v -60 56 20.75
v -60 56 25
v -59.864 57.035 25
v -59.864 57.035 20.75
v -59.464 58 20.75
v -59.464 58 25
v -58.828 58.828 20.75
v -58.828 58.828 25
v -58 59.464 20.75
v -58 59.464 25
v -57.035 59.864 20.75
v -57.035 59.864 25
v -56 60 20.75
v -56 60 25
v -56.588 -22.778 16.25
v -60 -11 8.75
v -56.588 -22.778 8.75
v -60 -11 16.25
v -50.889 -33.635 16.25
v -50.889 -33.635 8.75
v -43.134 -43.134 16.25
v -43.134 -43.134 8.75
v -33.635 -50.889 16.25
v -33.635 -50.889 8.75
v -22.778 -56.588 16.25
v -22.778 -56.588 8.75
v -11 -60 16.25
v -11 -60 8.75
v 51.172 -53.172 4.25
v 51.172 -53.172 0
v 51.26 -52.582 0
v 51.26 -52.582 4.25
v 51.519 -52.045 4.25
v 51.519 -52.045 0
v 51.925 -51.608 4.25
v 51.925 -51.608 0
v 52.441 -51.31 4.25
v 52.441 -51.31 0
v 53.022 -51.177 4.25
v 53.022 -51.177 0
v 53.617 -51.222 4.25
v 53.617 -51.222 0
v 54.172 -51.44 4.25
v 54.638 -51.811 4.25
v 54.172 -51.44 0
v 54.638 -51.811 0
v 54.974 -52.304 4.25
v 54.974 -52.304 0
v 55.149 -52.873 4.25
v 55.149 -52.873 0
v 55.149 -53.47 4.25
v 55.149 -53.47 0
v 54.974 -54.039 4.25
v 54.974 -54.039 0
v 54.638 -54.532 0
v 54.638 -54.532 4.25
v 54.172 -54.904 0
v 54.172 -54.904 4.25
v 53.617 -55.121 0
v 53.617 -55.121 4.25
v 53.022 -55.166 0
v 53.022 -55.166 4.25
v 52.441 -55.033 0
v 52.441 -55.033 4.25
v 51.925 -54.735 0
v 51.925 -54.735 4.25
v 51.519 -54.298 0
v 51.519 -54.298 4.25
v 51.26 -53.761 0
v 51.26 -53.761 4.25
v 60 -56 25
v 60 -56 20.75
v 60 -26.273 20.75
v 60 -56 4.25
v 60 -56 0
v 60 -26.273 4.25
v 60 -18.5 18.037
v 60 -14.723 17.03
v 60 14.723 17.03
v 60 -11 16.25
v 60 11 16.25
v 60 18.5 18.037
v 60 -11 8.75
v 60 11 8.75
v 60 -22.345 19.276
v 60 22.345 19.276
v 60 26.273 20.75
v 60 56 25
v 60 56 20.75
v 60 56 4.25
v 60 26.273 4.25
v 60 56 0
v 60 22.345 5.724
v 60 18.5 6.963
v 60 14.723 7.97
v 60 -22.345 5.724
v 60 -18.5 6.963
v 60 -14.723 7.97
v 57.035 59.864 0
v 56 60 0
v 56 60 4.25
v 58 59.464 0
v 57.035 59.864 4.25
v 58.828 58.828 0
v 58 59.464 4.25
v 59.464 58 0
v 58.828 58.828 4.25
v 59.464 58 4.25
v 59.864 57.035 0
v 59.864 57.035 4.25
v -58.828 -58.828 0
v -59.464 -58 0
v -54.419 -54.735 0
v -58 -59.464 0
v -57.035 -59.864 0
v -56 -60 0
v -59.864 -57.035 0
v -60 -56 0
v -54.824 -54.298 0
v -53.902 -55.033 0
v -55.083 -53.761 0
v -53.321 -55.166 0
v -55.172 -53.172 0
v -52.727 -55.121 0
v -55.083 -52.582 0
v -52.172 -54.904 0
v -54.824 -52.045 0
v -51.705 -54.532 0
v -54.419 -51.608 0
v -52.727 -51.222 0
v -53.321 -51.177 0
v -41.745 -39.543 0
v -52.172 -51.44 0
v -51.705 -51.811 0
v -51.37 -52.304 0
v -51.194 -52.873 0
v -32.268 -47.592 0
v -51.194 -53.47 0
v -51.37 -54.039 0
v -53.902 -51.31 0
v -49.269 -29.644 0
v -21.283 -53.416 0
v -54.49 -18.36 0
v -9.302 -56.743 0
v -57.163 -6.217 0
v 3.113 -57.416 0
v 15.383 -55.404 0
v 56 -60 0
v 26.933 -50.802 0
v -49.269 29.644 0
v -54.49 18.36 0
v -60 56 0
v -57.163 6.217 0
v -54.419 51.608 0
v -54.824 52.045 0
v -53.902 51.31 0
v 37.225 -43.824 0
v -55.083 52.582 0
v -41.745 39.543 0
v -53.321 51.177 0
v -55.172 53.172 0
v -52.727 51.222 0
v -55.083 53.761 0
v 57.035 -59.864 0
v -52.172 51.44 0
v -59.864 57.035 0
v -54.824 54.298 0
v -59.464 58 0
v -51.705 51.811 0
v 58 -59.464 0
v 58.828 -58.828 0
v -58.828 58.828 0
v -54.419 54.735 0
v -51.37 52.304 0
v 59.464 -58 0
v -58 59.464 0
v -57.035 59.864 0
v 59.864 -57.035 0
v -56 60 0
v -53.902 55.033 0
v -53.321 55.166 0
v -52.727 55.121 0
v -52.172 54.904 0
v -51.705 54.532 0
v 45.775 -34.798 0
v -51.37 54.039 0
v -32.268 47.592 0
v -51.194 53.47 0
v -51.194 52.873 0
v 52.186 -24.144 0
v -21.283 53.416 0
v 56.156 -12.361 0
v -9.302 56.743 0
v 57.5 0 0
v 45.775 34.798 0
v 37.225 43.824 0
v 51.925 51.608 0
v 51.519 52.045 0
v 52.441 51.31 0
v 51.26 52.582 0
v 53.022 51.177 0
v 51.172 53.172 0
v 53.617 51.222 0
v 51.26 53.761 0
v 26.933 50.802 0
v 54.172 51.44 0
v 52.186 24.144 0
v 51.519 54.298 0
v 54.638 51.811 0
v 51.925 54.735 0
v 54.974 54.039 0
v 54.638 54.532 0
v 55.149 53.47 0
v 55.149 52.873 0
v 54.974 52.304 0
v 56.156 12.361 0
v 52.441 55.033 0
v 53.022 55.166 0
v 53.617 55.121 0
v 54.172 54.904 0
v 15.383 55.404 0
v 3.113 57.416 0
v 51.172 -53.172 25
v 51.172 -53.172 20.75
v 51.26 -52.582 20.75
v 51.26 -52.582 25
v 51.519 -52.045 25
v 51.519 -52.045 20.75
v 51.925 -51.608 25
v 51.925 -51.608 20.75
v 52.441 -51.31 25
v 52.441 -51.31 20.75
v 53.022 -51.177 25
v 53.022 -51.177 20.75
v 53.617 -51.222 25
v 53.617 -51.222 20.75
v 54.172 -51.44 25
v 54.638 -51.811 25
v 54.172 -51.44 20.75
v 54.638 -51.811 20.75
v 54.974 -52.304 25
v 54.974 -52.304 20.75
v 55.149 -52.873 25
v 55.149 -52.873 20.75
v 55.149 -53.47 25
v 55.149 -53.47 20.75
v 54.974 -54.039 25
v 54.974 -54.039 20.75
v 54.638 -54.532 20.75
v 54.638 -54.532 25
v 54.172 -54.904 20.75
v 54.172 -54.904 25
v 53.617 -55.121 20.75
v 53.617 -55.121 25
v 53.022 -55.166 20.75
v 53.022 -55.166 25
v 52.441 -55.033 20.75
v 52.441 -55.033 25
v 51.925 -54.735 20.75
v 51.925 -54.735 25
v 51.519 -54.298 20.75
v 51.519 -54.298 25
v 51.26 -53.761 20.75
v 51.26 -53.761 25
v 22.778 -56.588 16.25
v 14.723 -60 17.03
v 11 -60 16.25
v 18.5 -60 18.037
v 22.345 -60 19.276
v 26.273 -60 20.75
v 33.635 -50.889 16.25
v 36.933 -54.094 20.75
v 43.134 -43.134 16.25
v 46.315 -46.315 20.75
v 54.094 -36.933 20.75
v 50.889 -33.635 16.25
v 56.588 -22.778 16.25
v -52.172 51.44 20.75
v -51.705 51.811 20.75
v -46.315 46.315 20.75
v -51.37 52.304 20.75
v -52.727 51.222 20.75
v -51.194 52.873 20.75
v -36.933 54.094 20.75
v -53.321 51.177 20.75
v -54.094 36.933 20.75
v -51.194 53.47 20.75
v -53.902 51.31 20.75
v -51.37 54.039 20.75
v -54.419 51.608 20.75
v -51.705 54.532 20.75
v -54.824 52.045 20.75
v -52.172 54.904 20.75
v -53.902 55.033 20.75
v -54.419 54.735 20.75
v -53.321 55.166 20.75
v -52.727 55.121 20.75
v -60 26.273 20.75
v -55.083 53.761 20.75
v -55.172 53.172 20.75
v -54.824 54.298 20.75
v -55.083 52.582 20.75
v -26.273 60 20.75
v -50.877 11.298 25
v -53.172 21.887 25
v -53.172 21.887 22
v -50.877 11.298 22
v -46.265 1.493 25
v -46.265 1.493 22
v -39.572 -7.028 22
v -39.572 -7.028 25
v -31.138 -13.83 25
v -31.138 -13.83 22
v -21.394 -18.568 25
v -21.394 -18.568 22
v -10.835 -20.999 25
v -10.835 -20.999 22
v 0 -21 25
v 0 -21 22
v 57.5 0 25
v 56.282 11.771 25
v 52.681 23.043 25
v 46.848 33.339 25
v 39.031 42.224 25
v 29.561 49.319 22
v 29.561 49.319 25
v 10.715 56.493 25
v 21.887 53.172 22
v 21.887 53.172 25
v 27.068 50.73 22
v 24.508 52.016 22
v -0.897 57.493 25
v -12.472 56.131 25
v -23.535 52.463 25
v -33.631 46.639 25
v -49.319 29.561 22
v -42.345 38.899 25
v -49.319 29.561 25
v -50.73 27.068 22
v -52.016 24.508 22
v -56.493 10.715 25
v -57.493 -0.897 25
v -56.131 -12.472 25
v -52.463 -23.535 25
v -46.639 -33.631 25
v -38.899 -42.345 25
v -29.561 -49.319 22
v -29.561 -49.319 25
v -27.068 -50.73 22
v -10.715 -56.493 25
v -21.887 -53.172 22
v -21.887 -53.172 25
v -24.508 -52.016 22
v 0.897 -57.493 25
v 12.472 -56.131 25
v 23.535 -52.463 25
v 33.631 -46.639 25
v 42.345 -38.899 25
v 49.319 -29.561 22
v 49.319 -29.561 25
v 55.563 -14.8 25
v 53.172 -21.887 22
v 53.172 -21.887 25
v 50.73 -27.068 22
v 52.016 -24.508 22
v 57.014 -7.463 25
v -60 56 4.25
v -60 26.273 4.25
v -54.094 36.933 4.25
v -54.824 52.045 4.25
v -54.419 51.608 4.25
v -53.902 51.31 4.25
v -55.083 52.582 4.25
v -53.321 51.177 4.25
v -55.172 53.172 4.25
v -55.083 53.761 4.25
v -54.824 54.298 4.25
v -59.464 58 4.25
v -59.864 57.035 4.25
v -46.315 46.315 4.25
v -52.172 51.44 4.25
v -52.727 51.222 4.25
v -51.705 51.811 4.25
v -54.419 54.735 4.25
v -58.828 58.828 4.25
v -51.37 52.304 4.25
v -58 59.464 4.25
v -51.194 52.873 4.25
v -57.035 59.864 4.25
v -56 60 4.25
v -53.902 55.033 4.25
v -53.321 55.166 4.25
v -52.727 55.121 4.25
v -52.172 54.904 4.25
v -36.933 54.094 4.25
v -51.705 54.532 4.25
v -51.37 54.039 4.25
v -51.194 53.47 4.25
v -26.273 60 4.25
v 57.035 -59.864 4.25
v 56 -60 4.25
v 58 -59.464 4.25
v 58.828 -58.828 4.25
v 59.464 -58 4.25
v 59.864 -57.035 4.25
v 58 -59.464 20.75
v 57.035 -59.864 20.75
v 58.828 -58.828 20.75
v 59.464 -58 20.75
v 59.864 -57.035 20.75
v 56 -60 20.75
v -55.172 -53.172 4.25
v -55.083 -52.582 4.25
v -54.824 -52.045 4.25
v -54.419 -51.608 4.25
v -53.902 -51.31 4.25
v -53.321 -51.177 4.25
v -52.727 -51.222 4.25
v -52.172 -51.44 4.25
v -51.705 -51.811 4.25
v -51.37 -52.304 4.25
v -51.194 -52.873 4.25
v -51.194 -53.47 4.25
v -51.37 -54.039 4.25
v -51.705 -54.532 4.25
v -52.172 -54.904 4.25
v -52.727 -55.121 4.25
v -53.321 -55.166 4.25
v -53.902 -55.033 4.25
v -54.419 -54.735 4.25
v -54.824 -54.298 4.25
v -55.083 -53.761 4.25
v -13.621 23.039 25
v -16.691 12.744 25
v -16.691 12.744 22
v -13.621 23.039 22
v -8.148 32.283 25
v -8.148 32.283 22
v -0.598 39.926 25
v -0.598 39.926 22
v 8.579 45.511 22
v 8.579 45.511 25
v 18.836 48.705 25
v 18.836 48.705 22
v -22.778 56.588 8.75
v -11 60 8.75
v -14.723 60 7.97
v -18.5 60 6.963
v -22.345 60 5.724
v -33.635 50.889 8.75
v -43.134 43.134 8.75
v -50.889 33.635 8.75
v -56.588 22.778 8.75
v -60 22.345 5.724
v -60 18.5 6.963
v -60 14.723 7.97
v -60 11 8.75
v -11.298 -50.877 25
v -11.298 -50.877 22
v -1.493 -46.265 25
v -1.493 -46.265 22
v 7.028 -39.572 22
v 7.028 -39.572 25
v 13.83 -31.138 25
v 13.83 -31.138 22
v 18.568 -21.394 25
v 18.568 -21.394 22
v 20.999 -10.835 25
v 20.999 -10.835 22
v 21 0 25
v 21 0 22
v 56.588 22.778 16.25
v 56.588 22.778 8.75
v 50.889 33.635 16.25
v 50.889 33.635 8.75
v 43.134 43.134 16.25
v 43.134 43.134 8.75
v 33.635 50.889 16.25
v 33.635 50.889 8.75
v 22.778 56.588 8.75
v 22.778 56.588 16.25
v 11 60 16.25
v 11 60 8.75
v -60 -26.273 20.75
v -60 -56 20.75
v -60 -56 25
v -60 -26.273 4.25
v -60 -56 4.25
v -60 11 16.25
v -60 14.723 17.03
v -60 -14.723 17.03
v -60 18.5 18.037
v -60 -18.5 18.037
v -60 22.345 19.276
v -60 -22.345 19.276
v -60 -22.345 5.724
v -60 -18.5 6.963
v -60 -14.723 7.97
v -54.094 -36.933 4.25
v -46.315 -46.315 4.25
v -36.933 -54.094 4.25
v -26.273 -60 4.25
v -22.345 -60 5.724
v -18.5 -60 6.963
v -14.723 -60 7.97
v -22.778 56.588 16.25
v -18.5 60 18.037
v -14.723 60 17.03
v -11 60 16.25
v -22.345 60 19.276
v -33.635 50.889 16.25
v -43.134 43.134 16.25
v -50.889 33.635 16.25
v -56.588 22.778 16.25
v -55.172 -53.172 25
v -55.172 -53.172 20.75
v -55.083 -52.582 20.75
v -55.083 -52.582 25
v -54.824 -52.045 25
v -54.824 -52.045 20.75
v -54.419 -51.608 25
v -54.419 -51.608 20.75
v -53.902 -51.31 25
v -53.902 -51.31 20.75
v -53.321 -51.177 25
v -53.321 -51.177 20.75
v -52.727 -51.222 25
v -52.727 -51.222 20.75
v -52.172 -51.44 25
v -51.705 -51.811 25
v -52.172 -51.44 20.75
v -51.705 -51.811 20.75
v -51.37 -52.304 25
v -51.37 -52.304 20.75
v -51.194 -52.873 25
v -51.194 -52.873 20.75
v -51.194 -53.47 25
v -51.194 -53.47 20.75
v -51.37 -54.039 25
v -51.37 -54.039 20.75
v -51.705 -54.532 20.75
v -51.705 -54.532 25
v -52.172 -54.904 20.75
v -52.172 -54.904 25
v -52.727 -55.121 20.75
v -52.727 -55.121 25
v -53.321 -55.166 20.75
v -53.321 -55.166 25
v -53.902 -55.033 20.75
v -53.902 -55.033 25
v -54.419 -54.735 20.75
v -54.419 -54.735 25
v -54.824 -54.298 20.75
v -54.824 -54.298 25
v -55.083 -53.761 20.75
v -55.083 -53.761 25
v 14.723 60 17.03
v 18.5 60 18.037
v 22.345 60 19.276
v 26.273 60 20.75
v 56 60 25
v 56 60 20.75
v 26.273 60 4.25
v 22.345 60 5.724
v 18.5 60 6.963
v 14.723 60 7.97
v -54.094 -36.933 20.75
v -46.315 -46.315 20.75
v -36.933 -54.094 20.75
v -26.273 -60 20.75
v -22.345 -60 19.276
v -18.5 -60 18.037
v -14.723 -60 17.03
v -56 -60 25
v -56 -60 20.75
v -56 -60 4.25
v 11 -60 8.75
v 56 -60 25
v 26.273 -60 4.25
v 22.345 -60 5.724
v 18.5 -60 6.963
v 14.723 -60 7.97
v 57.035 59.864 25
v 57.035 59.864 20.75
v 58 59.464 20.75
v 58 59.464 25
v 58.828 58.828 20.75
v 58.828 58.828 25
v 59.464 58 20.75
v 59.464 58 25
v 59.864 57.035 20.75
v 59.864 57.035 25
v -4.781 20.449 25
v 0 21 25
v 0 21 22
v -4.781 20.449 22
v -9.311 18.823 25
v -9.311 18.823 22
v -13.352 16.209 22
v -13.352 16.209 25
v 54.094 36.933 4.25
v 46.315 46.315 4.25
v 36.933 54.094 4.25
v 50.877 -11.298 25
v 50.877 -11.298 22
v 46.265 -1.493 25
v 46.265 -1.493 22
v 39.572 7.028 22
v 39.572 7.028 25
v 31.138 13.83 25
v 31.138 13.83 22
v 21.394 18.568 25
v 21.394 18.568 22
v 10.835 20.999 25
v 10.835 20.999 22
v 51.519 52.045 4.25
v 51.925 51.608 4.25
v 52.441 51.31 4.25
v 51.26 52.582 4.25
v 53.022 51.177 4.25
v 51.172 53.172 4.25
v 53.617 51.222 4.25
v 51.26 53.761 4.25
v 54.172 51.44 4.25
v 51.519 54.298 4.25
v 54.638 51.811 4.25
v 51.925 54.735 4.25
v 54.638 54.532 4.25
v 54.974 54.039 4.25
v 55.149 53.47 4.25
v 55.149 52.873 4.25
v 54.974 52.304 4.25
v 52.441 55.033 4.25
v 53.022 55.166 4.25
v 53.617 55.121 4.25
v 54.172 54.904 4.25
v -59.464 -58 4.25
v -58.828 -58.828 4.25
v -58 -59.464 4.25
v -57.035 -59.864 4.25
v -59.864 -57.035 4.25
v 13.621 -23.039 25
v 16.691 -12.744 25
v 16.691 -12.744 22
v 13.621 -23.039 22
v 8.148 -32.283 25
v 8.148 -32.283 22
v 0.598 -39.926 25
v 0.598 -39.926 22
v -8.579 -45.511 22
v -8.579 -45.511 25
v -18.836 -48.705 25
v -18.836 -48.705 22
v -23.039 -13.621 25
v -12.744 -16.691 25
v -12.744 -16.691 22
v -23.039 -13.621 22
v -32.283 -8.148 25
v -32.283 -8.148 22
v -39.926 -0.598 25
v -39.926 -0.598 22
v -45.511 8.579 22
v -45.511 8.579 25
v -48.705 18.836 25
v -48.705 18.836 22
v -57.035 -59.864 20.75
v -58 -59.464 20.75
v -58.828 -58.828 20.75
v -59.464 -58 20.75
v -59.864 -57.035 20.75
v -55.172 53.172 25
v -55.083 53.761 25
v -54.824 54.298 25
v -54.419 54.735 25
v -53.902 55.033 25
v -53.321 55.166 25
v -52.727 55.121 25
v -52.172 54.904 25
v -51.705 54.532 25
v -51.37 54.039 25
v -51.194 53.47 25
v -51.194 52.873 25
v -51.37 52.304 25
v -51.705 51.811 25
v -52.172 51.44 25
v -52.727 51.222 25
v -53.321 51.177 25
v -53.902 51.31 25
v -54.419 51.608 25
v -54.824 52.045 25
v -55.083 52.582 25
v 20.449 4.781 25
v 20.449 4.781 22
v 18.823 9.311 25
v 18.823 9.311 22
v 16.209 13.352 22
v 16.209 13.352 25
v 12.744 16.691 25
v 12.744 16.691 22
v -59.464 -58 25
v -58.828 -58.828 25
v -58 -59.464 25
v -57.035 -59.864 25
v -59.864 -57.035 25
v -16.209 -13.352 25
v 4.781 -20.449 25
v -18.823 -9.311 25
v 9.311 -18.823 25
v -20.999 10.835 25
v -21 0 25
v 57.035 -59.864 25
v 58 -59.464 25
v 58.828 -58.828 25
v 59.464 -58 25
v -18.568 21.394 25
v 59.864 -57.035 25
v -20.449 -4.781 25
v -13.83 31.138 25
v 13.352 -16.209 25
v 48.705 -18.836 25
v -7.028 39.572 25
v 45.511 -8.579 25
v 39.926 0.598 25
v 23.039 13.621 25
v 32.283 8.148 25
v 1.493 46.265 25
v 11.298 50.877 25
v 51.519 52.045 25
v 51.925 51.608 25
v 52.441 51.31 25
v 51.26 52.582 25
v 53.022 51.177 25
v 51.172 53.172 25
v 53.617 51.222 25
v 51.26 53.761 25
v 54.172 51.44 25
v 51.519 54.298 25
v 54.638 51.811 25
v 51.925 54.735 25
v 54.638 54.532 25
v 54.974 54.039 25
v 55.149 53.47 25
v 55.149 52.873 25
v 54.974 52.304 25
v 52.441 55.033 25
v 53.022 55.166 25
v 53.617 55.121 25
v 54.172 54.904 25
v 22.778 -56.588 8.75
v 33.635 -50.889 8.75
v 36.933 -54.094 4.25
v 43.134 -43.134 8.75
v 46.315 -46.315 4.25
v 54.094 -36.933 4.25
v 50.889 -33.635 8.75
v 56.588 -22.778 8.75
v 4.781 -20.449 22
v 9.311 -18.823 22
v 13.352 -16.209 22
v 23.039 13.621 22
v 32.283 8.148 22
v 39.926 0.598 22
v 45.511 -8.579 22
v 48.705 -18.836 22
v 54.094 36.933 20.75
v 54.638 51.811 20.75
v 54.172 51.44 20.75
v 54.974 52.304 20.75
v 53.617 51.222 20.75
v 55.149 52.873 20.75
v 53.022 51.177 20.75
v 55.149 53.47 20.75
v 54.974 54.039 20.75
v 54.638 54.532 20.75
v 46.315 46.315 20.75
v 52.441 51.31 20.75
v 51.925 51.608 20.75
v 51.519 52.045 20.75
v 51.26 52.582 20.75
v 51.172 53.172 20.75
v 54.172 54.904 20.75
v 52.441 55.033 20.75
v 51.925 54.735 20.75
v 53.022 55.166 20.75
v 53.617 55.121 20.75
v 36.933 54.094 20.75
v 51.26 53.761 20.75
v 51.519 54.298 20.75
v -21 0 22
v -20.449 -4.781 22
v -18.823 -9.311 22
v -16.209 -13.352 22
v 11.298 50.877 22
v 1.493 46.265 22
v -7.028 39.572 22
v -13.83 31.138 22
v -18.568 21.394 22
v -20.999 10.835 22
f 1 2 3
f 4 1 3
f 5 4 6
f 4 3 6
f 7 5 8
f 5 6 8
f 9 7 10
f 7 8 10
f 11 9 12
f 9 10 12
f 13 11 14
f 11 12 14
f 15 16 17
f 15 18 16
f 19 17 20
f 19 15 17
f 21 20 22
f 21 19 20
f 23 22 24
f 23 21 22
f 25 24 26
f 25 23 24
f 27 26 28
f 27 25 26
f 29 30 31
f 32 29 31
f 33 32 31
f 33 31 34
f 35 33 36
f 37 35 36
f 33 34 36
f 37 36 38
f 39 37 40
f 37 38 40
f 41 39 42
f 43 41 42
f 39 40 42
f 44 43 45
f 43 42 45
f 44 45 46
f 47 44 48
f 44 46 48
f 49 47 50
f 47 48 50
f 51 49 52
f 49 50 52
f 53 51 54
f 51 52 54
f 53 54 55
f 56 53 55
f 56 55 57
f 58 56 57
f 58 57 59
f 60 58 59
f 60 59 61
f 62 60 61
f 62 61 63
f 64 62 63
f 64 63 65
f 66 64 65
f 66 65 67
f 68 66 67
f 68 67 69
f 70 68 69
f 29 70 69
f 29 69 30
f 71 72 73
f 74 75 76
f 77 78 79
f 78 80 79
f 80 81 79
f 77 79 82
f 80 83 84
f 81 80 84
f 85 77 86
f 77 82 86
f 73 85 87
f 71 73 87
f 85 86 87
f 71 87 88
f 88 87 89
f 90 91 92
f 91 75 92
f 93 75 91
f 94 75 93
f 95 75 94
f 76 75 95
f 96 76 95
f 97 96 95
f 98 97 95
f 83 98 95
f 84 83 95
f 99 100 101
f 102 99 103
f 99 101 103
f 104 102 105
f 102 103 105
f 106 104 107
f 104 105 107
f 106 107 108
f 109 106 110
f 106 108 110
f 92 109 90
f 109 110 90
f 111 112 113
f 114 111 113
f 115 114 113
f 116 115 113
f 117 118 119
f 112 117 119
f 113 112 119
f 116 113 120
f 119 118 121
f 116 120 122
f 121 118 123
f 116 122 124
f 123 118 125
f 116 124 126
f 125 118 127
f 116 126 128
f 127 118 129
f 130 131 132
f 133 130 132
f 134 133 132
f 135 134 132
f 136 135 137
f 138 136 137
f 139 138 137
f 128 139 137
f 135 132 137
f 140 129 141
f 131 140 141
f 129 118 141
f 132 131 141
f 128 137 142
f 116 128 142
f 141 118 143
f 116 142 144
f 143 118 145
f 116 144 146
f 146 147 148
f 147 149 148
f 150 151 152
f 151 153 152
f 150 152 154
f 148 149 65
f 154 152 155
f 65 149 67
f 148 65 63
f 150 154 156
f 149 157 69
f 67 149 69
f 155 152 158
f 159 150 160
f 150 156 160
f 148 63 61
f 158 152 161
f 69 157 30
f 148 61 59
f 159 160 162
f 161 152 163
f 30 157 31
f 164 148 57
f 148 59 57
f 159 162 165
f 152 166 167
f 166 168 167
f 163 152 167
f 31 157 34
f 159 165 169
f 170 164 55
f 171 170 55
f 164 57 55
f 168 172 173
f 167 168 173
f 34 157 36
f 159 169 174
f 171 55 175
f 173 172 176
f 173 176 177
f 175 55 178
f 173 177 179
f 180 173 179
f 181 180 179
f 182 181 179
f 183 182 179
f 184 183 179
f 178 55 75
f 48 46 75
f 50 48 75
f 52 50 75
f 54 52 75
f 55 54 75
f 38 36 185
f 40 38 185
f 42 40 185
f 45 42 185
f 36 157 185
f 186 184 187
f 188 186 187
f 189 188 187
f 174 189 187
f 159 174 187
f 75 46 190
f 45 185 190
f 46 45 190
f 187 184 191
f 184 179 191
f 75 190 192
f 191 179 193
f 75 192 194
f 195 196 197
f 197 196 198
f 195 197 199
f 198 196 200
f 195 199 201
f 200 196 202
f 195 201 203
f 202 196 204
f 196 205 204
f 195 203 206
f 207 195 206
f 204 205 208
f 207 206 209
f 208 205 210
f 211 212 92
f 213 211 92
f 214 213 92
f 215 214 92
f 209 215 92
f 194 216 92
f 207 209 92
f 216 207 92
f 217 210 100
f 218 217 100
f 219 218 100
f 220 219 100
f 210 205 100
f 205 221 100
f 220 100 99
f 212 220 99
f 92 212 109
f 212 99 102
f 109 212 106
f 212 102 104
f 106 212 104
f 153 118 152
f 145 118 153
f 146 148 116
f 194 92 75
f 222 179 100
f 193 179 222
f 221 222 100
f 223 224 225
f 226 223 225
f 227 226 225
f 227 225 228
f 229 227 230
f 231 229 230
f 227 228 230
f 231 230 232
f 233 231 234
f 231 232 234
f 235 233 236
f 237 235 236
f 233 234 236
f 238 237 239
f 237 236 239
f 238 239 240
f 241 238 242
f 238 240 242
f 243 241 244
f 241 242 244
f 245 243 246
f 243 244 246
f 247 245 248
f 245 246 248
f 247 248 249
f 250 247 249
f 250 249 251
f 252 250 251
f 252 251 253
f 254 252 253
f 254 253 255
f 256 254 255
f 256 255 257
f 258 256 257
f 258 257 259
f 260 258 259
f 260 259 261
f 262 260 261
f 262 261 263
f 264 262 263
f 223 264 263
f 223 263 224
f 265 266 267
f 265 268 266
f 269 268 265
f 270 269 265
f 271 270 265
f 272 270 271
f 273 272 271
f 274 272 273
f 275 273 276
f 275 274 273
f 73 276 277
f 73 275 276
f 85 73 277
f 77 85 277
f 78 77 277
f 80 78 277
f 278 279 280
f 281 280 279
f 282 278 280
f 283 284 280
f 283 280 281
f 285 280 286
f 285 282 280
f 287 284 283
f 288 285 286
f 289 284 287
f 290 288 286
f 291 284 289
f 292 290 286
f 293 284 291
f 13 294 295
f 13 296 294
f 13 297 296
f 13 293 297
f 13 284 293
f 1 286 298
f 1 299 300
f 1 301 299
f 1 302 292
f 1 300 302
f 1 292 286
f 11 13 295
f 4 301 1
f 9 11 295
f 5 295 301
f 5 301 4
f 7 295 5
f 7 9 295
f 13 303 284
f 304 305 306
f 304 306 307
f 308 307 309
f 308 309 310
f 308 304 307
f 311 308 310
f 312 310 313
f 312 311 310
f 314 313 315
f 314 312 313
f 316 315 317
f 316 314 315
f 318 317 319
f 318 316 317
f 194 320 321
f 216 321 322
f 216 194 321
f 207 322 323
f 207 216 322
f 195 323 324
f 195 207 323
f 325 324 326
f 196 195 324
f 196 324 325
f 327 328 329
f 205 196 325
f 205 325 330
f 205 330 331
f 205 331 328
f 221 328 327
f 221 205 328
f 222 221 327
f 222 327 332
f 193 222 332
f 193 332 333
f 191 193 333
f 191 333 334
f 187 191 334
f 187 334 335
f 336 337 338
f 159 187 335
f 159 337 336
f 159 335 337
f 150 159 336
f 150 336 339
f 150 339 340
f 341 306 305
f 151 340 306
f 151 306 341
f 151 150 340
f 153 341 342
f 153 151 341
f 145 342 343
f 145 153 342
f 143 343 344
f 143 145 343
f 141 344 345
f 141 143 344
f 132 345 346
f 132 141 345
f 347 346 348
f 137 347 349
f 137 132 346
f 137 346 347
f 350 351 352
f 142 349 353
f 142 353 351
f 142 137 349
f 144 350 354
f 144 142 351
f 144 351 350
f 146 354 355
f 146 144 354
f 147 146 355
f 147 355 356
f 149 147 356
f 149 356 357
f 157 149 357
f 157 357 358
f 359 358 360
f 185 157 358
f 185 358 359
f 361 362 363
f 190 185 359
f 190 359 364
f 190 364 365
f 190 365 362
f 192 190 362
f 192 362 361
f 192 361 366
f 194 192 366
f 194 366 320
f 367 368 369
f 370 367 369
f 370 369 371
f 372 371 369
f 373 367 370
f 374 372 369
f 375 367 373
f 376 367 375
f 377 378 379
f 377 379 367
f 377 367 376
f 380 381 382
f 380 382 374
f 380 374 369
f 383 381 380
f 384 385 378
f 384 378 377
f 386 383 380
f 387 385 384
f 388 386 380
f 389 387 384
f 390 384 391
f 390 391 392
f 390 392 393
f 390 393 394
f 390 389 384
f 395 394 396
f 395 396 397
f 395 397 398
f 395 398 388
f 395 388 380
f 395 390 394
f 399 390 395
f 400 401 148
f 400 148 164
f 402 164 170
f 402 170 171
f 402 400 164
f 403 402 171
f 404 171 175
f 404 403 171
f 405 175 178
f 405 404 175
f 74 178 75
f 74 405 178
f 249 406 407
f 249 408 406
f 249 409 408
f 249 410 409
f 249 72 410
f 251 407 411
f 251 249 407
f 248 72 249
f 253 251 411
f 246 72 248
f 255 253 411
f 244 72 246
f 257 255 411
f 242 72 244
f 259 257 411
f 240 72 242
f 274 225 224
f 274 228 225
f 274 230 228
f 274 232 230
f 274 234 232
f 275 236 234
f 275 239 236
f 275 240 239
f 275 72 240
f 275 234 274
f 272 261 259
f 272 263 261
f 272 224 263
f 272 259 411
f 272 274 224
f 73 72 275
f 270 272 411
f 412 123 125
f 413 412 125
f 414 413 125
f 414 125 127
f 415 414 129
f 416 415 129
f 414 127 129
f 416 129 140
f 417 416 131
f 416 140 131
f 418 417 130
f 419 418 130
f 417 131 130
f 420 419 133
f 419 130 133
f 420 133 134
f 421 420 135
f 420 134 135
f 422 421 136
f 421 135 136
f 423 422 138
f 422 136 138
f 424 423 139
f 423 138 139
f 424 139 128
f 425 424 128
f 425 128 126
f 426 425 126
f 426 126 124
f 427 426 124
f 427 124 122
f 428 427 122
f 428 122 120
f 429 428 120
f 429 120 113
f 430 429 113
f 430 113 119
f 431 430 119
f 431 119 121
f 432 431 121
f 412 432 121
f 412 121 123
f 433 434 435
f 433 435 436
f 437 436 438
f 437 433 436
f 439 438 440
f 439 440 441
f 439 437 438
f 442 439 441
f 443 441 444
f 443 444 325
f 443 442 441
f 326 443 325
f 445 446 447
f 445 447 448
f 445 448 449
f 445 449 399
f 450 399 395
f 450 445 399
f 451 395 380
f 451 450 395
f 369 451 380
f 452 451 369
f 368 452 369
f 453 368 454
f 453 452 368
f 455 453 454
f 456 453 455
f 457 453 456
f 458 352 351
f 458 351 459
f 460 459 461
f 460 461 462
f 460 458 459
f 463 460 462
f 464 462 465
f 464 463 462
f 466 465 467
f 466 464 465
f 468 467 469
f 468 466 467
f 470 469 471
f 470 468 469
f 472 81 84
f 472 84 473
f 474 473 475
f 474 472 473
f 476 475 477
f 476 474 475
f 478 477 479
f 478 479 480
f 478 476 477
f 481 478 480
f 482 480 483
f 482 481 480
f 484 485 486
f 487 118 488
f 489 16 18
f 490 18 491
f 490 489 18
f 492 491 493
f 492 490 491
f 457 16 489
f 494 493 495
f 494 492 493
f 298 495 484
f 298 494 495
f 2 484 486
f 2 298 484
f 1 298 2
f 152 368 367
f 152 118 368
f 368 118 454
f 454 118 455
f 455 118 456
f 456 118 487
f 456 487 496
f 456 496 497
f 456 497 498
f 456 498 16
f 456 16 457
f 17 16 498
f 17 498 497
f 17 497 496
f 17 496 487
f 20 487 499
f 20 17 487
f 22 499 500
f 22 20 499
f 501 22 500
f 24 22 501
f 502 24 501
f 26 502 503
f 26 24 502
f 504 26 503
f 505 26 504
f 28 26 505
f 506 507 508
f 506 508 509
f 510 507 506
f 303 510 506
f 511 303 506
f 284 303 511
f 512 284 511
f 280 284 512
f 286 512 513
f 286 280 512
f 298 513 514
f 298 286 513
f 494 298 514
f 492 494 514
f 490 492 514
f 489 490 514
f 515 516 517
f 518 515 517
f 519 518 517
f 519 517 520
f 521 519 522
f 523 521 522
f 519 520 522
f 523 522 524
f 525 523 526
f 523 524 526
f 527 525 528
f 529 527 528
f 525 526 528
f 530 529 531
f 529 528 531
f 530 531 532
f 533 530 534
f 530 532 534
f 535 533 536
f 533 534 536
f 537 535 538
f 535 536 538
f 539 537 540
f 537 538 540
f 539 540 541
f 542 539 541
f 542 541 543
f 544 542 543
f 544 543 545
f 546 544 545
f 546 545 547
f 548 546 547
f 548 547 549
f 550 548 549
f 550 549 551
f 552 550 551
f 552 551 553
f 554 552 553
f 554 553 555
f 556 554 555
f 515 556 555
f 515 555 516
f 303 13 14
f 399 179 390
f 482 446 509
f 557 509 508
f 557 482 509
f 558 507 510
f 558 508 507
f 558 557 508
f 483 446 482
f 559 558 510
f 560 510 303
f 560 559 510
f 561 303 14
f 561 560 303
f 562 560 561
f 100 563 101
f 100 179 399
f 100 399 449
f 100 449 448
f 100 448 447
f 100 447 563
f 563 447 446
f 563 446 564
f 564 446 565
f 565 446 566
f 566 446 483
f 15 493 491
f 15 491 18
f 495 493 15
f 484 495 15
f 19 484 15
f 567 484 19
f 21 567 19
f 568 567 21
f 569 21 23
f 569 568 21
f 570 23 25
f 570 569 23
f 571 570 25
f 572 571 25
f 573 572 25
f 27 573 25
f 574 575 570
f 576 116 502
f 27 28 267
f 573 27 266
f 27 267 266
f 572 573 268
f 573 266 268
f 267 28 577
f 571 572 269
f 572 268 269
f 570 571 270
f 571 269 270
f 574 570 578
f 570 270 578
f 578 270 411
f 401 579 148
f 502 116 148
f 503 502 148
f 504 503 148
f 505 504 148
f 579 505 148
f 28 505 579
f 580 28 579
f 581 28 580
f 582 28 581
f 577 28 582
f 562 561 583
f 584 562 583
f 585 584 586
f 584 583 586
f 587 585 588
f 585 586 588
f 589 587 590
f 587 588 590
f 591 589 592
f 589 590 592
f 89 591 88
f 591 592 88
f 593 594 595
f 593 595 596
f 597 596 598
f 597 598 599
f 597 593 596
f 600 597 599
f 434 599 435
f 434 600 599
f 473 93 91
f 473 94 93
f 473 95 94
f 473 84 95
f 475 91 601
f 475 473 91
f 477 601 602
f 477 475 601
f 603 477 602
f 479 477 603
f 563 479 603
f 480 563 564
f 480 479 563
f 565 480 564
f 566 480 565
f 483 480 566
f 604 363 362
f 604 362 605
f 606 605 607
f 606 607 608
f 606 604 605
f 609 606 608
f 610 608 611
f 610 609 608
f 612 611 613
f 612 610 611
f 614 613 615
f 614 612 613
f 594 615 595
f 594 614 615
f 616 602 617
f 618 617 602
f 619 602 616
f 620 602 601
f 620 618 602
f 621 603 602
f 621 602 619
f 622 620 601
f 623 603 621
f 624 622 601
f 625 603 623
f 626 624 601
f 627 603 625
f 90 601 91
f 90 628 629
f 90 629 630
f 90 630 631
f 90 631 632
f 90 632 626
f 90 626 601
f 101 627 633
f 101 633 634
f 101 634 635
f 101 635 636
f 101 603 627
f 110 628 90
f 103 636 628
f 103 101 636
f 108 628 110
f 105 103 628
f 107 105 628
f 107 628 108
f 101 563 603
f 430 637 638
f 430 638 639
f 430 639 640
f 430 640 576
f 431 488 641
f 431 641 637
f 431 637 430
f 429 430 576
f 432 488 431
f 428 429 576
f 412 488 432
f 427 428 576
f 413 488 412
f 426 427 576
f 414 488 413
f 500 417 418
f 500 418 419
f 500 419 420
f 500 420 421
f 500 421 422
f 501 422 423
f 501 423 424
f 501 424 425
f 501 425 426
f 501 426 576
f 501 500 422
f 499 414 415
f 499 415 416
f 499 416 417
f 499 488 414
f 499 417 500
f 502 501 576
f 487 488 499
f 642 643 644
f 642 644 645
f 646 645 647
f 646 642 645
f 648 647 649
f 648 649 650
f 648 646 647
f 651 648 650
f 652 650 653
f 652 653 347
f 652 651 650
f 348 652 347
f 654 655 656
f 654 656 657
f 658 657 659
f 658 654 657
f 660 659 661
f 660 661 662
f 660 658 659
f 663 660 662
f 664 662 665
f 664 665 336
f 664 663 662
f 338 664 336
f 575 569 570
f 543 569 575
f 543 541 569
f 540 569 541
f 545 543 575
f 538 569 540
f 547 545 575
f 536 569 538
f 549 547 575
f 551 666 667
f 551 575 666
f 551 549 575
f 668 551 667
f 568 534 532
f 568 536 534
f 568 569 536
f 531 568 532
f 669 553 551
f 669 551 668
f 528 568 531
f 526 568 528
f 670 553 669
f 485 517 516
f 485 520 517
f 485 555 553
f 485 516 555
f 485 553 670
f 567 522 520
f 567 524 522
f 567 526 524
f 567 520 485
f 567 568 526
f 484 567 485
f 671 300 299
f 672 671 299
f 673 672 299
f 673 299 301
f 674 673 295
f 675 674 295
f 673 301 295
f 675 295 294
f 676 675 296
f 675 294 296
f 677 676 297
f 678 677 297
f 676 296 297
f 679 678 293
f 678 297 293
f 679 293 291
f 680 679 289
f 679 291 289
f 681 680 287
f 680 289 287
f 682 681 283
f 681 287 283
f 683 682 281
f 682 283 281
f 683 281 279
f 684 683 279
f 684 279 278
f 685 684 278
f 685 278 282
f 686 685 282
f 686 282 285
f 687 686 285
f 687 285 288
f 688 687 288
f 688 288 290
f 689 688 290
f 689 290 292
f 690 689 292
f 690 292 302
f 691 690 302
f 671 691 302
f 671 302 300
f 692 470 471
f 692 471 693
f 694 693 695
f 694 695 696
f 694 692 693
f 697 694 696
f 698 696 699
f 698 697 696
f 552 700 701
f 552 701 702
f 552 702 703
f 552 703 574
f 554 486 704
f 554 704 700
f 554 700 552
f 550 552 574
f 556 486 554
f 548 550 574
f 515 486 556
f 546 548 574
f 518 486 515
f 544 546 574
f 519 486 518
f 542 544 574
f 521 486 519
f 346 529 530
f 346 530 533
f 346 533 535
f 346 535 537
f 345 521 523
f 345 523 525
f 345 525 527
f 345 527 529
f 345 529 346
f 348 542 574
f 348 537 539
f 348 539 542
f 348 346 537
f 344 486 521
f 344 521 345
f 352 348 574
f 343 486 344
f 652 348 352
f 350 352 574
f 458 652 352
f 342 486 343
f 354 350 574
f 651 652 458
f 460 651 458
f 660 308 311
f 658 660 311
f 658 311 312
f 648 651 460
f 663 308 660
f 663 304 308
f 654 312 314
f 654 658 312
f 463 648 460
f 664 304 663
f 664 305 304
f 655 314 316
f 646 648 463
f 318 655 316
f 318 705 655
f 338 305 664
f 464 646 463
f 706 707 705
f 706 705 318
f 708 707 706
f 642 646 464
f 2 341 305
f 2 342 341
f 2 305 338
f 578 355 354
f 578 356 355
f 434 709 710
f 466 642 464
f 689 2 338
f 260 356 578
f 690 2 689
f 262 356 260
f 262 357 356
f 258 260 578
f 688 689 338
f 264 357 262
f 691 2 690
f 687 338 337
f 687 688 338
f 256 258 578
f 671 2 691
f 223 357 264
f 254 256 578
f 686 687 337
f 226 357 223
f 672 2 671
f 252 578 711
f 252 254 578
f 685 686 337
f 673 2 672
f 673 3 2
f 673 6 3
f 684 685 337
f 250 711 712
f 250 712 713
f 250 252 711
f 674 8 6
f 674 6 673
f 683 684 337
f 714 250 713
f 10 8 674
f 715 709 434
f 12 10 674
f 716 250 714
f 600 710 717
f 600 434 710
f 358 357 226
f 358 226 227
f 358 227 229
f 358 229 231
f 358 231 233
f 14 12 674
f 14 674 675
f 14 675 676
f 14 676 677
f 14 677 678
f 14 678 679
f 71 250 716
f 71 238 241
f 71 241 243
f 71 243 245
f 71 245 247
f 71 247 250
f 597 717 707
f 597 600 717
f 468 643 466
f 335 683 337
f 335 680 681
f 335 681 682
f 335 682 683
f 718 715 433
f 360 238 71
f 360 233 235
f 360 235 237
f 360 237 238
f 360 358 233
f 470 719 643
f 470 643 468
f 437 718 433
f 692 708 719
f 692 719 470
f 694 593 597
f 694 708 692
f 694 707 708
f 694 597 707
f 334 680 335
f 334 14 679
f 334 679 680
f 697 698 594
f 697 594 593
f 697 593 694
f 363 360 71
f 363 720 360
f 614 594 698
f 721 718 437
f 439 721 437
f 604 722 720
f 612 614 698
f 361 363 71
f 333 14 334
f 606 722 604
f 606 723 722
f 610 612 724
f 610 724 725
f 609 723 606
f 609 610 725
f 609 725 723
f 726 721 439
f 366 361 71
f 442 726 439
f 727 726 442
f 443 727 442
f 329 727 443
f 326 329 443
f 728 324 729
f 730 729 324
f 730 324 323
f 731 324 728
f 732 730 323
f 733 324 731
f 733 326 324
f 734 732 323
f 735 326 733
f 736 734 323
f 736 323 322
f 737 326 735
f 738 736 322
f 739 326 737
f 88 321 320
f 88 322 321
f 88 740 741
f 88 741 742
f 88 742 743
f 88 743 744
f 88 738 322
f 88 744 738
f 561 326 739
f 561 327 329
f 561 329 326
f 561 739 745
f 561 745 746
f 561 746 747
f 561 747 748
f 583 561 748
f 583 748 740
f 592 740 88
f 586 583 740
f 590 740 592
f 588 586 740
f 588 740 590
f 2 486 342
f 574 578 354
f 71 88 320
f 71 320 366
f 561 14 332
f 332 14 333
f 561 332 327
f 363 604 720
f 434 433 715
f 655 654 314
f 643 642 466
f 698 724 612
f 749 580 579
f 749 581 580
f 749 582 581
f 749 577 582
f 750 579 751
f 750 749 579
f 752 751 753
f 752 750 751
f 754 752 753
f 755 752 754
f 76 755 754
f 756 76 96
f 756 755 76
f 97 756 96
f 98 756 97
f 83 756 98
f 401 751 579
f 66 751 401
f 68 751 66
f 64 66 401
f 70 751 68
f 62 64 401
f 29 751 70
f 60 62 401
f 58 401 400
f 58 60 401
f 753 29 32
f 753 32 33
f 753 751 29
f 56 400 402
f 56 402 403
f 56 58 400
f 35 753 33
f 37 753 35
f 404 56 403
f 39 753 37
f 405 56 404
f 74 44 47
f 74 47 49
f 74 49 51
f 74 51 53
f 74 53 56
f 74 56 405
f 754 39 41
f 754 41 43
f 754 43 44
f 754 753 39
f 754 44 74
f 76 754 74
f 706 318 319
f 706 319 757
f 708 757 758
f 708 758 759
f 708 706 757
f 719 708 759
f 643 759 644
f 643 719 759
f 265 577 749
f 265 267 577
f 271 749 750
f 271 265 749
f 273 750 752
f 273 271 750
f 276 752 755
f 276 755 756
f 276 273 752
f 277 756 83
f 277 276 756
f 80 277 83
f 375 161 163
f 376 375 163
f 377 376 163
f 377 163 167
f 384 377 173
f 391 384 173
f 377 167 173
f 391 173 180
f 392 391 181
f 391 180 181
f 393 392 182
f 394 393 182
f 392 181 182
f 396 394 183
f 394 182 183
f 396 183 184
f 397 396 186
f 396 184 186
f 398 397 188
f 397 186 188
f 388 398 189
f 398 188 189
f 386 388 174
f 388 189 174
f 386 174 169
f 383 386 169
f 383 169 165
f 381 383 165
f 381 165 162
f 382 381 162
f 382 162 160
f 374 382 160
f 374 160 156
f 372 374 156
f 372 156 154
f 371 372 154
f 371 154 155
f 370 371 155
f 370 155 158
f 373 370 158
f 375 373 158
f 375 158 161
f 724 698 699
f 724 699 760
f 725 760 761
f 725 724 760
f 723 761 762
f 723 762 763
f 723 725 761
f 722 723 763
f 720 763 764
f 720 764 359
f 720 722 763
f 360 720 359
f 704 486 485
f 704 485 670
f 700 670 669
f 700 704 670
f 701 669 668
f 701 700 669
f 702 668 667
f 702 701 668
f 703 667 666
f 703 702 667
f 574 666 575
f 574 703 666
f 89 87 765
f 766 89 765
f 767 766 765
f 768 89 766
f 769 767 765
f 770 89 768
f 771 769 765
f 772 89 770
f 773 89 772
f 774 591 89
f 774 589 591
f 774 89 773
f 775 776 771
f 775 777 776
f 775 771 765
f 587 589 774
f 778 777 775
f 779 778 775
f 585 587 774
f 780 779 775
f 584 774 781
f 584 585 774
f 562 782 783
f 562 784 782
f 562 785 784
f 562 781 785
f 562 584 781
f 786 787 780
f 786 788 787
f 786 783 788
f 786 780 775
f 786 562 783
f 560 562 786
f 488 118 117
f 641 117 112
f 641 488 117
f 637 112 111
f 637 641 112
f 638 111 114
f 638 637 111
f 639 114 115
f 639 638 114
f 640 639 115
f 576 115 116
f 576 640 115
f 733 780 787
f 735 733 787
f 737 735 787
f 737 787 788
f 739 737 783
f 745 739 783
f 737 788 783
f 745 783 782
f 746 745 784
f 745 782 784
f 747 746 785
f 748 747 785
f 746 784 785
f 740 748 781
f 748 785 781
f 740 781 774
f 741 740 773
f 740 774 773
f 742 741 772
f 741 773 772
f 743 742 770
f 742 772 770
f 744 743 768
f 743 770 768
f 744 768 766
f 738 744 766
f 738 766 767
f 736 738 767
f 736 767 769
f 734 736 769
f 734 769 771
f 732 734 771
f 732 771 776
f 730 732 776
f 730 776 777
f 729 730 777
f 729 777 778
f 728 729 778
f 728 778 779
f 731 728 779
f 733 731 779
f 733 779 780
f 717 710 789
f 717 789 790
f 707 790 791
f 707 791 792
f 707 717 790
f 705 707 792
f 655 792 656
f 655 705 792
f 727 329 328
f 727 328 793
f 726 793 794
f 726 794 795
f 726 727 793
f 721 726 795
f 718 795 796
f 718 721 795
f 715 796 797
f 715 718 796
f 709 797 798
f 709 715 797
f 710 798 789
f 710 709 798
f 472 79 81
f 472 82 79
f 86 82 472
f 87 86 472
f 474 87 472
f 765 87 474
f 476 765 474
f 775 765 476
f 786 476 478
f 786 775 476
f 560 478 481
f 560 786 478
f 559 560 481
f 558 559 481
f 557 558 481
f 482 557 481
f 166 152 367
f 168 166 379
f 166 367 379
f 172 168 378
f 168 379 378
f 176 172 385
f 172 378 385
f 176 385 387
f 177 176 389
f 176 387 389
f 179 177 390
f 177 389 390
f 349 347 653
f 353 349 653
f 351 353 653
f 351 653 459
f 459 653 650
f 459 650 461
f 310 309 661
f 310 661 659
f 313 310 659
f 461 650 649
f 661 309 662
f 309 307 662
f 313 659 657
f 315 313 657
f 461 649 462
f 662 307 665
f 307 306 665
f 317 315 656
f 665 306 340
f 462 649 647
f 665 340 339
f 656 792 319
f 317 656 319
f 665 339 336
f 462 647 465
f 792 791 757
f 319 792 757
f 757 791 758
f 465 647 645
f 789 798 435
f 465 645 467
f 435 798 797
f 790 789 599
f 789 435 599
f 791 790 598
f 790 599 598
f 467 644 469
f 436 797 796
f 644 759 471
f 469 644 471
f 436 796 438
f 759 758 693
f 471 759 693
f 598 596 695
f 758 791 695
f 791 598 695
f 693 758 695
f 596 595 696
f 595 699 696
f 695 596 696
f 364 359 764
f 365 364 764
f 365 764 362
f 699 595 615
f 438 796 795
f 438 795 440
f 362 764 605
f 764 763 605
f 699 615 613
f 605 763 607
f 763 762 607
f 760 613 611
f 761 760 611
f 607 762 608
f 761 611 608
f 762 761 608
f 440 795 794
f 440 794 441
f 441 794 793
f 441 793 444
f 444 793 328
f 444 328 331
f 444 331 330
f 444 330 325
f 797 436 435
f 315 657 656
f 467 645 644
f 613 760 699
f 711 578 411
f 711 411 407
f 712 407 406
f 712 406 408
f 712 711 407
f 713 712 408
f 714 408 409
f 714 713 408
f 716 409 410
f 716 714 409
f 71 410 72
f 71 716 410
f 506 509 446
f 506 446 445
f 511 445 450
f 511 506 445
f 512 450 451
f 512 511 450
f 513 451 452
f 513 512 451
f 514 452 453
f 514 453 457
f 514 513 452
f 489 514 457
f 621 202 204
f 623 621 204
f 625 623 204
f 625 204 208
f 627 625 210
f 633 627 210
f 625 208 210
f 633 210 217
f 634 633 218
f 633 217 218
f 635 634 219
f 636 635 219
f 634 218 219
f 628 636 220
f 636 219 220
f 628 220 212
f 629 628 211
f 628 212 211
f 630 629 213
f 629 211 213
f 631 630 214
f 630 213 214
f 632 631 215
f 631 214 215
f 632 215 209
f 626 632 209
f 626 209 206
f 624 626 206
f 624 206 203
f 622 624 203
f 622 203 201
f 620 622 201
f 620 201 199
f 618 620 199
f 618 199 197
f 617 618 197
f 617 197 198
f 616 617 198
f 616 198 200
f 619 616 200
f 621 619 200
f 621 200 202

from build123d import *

# Parameters (mm, degrees)
SKETCH1_W           = 120
SKETCH1_H           = 120
SKETCH1_R           = 57.5
BOSS_EXTRUDE1_DEPTH = 25
FILLET1_R           = 4
SKETCH3_R           = 2
CUT_EXTRUDE1_DEPTH  = 26
BOSS_EXTRUDE2_DEPTH = 3


with BuildPart() as part:
    # Sketch1 → Boss-Extrude1 (new body)
    with BuildSketch(Plane.XY):
        Rectangle(SKETCH1_W, SKETCH1_H)
        Circle(SKETCH1_R, mode=Mode.SUBTRACT)
    extrude(amount=BOSS_EXTRUDE1_DEPTH)

    # Fillet1
    fillet1_edges = [part.edges().sort_by_distance(p)[0] for p in [
        (-60, 60, 12.5),
        (60, 60, 12.5),
        (60, -60, 12.5),
        (-60, -60, 12.5),
    ]]
    fillet(fillet1_edges, radius=FILLET1_R)

    # Sketch2 → Cut-Revolve1 (revolve, cut)
    with BuildSketch(Plane(origin=(0, 0, 0), x_dir=(1, 0, 0), z_dir=(0, 1, 0))):
        Polygon((61, -8.75), (61, -16.25), (65.5, -20.75), (86, -20.75), (86, -4.25), (65.5, -4.25), align=None)
    revolve(axis=Axis((0, 0, 0), (0, 0, 1)), mode=Mode.SUBTRACT)

    # Sketch3 → Cut-Extrude1 (cut, through all)
    with BuildSketch(Plane(origin=(0, 0, 0), x_dir=(-1, 0, 0), z_dir=(0, 0, -1))):
        with Locations((-53.171572875, 53.171572875)):
            Circle(SKETCH3_R)
        with Locations((53.171572875, 53.171572875)):
            Circle(SKETCH3_R)
        with Locations((53.171572875, -53.171572875)):
            Circle(SKETCH3_R)
        with Locations((-53.171572875, -53.171572875)):
            Circle(SKETCH3_R)
    extrude(amount=-CUT_EXTRUDE1_DEPTH, mode=Mode.SUBTRACT)

    # Sketch4 → Boss-Extrude2 (add)
    with BuildSketch(Plane.XY.offset(25)):
        with BuildLine():
            ThreePointArc((0, 21), (-9.310739966, 18.823127298), (-16.691166059, 12.743821075))
            ThreePointArc((-16.691166059, 12.743821075), (-0.598422961, 39.925677295), (29.560959215, 49.319364252))
            ThreePointArc((29.560959215, 49.319364252), (25.795909203, 51.388919704), (21.886841663, 53.171572875))
            ThreePointArc((21.886841663, 53.171572875), (-10.667756929, 35.547780517), (-21, 0))
            ThreePointArc((-21, 0), (-18.823127298, -9.310739966), (-12.743821075, -16.691166059))
            ThreePointArc((-12.743821075, -16.691166059), (-39.925677295, -0.598422961), (-49.319364252, 29.560959215))
            ThreePointArc((-49.319364252, 29.560959215), (-51.388919704, 25.795909203), (-53.171572875, 21.886841663))
            ThreePointArc((-53.171572875, 21.886841663), (-35.547780517, -10.667756929), (0, -21))
            ThreePointArc((0, -21), (9.310739966, -18.823127298), (16.691166059, -12.743821075))
            ThreePointArc((16.691166059, -12.743821075), (0.598422961, -39.925677295), (-29.560959215, -49.319364252))
            ThreePointArc((-29.560959215, -49.319364252), (-25.795909203, -51.388919704), (-21.886841663, -53.171572875))
            ThreePointArc((-21.886841663, -53.171572875), (10.667756929, -35.547780517), (21, 0))
            ThreePointArc((21, 0), (18.823127298, 9.310739966), (12.743821075, 16.691166059))
            ThreePointArc((12.743821075, 16.691166059), (39.925677295, 0.598422961), (49.319364252, -29.560959215))
            ThreePointArc((49.319364252, -29.560959215), (51.388919704, -25.795909203), (53.171572875, -21.886841663))
            ThreePointArc((53.171572875, -21.886841663), (35.547780517, 10.667756929), (0, 21))
        make_face()
    extrude(amount=-BOSS_EXTRUDE2_DEPTH)


solid = part.part
